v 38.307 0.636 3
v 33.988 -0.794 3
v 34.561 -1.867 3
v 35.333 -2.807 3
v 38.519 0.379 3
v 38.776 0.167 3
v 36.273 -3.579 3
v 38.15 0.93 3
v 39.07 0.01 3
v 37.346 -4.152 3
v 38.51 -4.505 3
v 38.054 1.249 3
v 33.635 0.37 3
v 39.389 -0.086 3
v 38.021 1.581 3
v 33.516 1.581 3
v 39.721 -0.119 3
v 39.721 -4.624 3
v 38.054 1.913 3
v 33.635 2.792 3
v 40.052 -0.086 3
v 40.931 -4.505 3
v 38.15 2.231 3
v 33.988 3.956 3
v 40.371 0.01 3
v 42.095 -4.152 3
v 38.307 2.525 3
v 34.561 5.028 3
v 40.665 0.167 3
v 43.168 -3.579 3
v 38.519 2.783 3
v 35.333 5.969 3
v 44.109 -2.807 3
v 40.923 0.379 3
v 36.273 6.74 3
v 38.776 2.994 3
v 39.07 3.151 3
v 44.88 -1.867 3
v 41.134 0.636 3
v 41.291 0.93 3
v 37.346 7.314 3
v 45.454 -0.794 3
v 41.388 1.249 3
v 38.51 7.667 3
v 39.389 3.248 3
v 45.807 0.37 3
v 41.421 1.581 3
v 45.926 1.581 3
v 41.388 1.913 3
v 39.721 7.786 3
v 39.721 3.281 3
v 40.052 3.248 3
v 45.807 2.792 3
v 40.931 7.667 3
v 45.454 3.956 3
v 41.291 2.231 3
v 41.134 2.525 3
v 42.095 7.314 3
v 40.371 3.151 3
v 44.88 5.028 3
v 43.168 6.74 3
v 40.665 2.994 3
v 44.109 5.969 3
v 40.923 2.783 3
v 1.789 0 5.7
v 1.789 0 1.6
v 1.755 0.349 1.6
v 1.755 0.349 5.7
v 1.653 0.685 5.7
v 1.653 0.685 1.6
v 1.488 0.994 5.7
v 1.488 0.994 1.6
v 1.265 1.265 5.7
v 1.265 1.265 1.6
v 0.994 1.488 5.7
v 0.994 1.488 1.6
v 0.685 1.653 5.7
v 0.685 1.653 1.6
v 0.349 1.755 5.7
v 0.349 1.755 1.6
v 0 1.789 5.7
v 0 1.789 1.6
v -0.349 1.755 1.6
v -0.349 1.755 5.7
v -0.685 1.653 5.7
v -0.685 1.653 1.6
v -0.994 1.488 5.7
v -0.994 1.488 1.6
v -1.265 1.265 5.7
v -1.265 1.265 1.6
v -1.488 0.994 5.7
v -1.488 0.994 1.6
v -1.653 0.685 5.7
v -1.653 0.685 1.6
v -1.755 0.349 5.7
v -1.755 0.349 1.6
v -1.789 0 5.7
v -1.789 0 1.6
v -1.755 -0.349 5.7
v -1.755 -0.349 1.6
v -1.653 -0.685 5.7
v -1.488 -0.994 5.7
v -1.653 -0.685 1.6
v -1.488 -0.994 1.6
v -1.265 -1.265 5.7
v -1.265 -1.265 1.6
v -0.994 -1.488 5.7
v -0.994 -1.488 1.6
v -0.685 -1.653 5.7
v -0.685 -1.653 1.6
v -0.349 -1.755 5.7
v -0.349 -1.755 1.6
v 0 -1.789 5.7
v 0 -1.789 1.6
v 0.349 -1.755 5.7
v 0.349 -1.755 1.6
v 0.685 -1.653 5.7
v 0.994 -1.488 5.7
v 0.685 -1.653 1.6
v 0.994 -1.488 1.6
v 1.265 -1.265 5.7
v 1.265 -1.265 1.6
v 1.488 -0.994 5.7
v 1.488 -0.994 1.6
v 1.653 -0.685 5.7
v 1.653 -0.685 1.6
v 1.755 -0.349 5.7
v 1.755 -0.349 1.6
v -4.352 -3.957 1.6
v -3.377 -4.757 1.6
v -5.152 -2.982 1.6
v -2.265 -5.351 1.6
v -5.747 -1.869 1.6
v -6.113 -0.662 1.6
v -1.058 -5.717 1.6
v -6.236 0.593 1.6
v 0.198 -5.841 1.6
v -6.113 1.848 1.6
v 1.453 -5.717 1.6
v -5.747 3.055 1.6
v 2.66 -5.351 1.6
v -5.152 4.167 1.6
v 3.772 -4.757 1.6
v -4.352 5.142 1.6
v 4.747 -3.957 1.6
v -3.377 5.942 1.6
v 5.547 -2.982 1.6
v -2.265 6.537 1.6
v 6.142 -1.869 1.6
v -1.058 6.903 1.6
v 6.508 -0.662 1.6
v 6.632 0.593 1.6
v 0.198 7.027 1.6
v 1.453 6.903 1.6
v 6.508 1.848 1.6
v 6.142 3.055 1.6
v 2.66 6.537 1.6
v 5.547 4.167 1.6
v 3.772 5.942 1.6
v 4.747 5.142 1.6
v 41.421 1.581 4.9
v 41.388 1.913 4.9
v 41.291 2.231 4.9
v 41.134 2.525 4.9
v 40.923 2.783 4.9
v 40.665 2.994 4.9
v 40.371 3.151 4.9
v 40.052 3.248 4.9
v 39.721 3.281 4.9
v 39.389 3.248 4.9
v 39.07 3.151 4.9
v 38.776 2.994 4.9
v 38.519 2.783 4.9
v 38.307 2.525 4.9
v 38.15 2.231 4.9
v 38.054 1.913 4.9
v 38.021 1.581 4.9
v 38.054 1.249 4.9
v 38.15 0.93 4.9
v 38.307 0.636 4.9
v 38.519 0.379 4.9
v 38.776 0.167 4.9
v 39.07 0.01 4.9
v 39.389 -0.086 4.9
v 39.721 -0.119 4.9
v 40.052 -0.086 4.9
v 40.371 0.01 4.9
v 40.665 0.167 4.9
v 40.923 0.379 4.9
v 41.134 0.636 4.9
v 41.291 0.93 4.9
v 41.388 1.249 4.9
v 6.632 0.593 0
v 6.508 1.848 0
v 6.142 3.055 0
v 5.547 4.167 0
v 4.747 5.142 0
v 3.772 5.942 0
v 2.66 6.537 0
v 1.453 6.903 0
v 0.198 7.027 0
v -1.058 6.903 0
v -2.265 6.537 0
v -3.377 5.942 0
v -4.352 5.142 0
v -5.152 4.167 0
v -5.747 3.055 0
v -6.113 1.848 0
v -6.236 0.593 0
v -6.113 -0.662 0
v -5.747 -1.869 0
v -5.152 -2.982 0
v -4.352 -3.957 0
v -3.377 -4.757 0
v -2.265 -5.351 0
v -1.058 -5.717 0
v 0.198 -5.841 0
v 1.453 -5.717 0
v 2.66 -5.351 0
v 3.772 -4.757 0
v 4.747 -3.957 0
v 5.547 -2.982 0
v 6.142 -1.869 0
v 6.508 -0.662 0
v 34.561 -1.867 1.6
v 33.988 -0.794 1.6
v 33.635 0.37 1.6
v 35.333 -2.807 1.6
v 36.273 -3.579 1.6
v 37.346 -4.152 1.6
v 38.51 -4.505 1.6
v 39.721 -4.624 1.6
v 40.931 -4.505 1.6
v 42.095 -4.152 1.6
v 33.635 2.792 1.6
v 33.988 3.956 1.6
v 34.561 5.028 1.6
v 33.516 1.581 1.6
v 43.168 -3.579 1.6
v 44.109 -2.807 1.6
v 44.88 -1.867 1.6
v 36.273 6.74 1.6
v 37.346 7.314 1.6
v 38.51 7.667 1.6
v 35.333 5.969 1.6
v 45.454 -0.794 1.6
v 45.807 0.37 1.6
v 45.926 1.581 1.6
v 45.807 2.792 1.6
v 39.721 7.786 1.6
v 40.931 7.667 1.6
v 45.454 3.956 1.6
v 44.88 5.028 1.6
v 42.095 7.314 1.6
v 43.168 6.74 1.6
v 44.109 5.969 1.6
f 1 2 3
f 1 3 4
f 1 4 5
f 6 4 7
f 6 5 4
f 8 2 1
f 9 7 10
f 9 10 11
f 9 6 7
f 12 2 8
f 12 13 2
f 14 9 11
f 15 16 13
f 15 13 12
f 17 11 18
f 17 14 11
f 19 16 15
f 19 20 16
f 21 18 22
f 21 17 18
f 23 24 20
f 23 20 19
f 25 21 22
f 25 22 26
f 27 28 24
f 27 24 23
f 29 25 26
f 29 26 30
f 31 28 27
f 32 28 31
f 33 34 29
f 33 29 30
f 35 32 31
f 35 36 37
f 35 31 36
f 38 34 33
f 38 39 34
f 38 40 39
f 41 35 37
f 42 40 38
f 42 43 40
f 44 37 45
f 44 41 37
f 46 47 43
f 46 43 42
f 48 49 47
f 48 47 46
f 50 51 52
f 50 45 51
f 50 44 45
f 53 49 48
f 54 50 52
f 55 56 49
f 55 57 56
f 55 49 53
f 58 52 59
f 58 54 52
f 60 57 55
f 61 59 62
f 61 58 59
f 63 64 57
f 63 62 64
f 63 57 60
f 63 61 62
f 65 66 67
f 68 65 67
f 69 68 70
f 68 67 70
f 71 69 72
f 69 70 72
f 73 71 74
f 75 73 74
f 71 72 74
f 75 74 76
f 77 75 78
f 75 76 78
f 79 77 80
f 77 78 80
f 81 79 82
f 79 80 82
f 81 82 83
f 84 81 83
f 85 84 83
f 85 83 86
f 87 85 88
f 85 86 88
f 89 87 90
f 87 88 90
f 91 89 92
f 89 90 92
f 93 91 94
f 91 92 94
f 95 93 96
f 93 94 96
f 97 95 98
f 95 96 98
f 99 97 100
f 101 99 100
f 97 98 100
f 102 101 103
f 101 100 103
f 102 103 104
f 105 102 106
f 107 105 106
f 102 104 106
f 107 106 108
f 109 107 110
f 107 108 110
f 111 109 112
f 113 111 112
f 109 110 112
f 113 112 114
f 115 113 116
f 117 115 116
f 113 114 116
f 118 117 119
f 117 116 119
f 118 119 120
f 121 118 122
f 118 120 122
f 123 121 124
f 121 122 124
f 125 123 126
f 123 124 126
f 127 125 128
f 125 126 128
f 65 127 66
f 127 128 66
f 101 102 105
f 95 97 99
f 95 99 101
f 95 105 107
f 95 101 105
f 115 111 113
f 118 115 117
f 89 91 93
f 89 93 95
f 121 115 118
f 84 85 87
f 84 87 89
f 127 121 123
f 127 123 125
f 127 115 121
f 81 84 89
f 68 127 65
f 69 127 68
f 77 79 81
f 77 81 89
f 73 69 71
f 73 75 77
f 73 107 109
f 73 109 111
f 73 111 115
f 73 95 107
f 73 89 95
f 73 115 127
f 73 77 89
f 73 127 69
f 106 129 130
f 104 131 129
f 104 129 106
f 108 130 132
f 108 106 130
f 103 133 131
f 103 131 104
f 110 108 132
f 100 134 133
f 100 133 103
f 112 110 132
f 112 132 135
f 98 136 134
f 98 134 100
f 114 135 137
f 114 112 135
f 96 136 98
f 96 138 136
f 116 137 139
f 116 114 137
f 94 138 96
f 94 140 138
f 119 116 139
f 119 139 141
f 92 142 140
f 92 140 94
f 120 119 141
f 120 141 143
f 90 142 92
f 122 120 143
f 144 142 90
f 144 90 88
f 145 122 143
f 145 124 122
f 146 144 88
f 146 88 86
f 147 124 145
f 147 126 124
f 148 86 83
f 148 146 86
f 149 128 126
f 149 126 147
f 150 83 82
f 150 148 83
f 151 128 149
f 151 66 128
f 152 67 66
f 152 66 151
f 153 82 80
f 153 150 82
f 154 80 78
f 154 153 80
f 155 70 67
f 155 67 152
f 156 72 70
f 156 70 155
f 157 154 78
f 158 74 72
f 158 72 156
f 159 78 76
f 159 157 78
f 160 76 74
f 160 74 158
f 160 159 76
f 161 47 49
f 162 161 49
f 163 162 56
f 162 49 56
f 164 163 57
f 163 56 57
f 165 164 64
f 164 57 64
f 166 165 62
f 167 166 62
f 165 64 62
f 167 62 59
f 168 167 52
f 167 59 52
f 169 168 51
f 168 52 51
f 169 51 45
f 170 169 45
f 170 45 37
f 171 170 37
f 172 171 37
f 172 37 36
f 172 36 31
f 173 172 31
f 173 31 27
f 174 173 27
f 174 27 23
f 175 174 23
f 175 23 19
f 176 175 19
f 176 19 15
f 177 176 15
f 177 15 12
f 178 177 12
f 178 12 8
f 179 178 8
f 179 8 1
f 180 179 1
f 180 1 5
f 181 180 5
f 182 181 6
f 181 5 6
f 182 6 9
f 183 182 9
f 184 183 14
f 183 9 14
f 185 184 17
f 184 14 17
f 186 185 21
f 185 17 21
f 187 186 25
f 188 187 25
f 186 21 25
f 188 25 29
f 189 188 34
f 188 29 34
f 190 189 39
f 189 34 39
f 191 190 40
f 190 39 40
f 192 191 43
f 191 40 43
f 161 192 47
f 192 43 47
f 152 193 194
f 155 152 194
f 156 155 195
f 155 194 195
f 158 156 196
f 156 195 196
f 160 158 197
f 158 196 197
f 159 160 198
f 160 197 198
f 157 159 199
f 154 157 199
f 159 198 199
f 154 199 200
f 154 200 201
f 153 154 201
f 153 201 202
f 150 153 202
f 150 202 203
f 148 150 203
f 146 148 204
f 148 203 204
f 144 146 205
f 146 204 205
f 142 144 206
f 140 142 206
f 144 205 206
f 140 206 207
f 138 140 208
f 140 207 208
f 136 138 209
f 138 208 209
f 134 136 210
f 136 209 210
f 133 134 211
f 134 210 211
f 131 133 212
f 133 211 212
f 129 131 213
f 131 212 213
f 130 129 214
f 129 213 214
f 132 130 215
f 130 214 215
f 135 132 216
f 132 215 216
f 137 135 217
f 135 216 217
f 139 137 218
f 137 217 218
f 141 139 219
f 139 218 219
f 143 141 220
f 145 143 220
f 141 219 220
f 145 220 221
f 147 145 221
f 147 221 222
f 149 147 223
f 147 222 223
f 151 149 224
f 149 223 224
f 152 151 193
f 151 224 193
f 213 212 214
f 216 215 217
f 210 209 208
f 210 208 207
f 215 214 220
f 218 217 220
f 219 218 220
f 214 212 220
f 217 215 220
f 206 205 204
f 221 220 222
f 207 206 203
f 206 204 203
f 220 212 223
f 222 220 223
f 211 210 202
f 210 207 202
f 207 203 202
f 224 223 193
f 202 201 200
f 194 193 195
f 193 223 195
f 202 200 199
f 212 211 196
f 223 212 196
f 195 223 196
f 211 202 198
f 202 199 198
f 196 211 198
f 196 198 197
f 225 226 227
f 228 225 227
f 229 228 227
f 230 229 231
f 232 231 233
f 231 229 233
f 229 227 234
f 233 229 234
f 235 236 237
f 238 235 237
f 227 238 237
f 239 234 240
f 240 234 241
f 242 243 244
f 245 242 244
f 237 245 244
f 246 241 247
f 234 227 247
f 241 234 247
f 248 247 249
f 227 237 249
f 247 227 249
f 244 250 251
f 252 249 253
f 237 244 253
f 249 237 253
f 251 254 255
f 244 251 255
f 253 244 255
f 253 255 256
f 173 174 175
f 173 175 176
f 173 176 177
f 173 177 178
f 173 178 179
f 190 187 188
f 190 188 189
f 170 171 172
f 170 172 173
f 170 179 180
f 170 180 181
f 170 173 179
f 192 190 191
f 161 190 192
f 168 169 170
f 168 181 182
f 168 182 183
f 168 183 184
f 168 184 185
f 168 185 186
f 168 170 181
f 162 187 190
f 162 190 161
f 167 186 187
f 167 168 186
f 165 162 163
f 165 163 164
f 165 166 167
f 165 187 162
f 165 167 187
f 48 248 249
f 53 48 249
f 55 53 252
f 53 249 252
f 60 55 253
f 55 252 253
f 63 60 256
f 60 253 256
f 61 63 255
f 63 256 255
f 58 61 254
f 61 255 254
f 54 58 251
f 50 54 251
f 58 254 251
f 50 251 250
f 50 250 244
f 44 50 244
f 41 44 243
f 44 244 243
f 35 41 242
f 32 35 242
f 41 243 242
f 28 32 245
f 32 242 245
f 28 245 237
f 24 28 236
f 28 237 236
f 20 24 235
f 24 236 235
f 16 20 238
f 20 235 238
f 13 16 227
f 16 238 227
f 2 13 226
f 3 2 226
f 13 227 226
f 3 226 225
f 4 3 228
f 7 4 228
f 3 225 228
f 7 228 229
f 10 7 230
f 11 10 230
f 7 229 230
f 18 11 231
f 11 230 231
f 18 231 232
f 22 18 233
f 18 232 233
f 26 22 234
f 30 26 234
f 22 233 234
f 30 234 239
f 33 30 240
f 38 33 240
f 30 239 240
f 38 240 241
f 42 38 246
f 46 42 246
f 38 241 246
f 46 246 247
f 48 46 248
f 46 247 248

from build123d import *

# Parameters (mm, degrees)
F0_R      = 6.433913
F1_DEPTH  = 1.6
F2_R      = 1.78949
F3_DEPTH  = 4.1
F4_R      = 6.20527
F5_DEPTH  = 1.4
F6_R      = 1.699958
F7_DEPTH  = 3.8
F7_FACE_R = 1.699958
F8_DEPTH  = 1.9


with BuildPart() as f1:
    # F0 (on Top) → F1 (new body)
    with BuildSketch(Plane.XY):
        with Locations((0.197615, 0.592848)):
            Circle(F0_R)
    extrude(amount=F1_DEPTH)

    # F2 (on face) → F3 (join)
    with BuildSketch(Plane.XY.offset(1.6)):
        Circle(F2_R)
    extrude(amount=F3_DEPTH)


with BuildPart() as f5:
    # F4 (on face) → F5 (new body)
    with BuildSketch(Plane.XY.offset(1.6)):
        with Locations((39.72083, 1.580929)):
            Circle(F4_R)
    extrude(amount=F5_DEPTH)

    # F6 (on face) → F7 (join)
    with BuildSketch(Plane.XY.offset(3)):
        with Locations((39.72083, 1.580929)):
            Circle(F6_R)
    extrude(amount=F7_DEPTH)

    # F7_face (on face) → F8 (cut)
    with BuildSketch(Plane(origin=(39.72083, 1.580929, 6.8), x_dir=(1, 0, 0), z_dir=(0, 0, 1))):
        Circle(F7_FACE_R)
    extrude(amount=-F8_DEPTH, mode=Mode.SUBTRACT)


solid = Compound([f1.part, f5.part])
